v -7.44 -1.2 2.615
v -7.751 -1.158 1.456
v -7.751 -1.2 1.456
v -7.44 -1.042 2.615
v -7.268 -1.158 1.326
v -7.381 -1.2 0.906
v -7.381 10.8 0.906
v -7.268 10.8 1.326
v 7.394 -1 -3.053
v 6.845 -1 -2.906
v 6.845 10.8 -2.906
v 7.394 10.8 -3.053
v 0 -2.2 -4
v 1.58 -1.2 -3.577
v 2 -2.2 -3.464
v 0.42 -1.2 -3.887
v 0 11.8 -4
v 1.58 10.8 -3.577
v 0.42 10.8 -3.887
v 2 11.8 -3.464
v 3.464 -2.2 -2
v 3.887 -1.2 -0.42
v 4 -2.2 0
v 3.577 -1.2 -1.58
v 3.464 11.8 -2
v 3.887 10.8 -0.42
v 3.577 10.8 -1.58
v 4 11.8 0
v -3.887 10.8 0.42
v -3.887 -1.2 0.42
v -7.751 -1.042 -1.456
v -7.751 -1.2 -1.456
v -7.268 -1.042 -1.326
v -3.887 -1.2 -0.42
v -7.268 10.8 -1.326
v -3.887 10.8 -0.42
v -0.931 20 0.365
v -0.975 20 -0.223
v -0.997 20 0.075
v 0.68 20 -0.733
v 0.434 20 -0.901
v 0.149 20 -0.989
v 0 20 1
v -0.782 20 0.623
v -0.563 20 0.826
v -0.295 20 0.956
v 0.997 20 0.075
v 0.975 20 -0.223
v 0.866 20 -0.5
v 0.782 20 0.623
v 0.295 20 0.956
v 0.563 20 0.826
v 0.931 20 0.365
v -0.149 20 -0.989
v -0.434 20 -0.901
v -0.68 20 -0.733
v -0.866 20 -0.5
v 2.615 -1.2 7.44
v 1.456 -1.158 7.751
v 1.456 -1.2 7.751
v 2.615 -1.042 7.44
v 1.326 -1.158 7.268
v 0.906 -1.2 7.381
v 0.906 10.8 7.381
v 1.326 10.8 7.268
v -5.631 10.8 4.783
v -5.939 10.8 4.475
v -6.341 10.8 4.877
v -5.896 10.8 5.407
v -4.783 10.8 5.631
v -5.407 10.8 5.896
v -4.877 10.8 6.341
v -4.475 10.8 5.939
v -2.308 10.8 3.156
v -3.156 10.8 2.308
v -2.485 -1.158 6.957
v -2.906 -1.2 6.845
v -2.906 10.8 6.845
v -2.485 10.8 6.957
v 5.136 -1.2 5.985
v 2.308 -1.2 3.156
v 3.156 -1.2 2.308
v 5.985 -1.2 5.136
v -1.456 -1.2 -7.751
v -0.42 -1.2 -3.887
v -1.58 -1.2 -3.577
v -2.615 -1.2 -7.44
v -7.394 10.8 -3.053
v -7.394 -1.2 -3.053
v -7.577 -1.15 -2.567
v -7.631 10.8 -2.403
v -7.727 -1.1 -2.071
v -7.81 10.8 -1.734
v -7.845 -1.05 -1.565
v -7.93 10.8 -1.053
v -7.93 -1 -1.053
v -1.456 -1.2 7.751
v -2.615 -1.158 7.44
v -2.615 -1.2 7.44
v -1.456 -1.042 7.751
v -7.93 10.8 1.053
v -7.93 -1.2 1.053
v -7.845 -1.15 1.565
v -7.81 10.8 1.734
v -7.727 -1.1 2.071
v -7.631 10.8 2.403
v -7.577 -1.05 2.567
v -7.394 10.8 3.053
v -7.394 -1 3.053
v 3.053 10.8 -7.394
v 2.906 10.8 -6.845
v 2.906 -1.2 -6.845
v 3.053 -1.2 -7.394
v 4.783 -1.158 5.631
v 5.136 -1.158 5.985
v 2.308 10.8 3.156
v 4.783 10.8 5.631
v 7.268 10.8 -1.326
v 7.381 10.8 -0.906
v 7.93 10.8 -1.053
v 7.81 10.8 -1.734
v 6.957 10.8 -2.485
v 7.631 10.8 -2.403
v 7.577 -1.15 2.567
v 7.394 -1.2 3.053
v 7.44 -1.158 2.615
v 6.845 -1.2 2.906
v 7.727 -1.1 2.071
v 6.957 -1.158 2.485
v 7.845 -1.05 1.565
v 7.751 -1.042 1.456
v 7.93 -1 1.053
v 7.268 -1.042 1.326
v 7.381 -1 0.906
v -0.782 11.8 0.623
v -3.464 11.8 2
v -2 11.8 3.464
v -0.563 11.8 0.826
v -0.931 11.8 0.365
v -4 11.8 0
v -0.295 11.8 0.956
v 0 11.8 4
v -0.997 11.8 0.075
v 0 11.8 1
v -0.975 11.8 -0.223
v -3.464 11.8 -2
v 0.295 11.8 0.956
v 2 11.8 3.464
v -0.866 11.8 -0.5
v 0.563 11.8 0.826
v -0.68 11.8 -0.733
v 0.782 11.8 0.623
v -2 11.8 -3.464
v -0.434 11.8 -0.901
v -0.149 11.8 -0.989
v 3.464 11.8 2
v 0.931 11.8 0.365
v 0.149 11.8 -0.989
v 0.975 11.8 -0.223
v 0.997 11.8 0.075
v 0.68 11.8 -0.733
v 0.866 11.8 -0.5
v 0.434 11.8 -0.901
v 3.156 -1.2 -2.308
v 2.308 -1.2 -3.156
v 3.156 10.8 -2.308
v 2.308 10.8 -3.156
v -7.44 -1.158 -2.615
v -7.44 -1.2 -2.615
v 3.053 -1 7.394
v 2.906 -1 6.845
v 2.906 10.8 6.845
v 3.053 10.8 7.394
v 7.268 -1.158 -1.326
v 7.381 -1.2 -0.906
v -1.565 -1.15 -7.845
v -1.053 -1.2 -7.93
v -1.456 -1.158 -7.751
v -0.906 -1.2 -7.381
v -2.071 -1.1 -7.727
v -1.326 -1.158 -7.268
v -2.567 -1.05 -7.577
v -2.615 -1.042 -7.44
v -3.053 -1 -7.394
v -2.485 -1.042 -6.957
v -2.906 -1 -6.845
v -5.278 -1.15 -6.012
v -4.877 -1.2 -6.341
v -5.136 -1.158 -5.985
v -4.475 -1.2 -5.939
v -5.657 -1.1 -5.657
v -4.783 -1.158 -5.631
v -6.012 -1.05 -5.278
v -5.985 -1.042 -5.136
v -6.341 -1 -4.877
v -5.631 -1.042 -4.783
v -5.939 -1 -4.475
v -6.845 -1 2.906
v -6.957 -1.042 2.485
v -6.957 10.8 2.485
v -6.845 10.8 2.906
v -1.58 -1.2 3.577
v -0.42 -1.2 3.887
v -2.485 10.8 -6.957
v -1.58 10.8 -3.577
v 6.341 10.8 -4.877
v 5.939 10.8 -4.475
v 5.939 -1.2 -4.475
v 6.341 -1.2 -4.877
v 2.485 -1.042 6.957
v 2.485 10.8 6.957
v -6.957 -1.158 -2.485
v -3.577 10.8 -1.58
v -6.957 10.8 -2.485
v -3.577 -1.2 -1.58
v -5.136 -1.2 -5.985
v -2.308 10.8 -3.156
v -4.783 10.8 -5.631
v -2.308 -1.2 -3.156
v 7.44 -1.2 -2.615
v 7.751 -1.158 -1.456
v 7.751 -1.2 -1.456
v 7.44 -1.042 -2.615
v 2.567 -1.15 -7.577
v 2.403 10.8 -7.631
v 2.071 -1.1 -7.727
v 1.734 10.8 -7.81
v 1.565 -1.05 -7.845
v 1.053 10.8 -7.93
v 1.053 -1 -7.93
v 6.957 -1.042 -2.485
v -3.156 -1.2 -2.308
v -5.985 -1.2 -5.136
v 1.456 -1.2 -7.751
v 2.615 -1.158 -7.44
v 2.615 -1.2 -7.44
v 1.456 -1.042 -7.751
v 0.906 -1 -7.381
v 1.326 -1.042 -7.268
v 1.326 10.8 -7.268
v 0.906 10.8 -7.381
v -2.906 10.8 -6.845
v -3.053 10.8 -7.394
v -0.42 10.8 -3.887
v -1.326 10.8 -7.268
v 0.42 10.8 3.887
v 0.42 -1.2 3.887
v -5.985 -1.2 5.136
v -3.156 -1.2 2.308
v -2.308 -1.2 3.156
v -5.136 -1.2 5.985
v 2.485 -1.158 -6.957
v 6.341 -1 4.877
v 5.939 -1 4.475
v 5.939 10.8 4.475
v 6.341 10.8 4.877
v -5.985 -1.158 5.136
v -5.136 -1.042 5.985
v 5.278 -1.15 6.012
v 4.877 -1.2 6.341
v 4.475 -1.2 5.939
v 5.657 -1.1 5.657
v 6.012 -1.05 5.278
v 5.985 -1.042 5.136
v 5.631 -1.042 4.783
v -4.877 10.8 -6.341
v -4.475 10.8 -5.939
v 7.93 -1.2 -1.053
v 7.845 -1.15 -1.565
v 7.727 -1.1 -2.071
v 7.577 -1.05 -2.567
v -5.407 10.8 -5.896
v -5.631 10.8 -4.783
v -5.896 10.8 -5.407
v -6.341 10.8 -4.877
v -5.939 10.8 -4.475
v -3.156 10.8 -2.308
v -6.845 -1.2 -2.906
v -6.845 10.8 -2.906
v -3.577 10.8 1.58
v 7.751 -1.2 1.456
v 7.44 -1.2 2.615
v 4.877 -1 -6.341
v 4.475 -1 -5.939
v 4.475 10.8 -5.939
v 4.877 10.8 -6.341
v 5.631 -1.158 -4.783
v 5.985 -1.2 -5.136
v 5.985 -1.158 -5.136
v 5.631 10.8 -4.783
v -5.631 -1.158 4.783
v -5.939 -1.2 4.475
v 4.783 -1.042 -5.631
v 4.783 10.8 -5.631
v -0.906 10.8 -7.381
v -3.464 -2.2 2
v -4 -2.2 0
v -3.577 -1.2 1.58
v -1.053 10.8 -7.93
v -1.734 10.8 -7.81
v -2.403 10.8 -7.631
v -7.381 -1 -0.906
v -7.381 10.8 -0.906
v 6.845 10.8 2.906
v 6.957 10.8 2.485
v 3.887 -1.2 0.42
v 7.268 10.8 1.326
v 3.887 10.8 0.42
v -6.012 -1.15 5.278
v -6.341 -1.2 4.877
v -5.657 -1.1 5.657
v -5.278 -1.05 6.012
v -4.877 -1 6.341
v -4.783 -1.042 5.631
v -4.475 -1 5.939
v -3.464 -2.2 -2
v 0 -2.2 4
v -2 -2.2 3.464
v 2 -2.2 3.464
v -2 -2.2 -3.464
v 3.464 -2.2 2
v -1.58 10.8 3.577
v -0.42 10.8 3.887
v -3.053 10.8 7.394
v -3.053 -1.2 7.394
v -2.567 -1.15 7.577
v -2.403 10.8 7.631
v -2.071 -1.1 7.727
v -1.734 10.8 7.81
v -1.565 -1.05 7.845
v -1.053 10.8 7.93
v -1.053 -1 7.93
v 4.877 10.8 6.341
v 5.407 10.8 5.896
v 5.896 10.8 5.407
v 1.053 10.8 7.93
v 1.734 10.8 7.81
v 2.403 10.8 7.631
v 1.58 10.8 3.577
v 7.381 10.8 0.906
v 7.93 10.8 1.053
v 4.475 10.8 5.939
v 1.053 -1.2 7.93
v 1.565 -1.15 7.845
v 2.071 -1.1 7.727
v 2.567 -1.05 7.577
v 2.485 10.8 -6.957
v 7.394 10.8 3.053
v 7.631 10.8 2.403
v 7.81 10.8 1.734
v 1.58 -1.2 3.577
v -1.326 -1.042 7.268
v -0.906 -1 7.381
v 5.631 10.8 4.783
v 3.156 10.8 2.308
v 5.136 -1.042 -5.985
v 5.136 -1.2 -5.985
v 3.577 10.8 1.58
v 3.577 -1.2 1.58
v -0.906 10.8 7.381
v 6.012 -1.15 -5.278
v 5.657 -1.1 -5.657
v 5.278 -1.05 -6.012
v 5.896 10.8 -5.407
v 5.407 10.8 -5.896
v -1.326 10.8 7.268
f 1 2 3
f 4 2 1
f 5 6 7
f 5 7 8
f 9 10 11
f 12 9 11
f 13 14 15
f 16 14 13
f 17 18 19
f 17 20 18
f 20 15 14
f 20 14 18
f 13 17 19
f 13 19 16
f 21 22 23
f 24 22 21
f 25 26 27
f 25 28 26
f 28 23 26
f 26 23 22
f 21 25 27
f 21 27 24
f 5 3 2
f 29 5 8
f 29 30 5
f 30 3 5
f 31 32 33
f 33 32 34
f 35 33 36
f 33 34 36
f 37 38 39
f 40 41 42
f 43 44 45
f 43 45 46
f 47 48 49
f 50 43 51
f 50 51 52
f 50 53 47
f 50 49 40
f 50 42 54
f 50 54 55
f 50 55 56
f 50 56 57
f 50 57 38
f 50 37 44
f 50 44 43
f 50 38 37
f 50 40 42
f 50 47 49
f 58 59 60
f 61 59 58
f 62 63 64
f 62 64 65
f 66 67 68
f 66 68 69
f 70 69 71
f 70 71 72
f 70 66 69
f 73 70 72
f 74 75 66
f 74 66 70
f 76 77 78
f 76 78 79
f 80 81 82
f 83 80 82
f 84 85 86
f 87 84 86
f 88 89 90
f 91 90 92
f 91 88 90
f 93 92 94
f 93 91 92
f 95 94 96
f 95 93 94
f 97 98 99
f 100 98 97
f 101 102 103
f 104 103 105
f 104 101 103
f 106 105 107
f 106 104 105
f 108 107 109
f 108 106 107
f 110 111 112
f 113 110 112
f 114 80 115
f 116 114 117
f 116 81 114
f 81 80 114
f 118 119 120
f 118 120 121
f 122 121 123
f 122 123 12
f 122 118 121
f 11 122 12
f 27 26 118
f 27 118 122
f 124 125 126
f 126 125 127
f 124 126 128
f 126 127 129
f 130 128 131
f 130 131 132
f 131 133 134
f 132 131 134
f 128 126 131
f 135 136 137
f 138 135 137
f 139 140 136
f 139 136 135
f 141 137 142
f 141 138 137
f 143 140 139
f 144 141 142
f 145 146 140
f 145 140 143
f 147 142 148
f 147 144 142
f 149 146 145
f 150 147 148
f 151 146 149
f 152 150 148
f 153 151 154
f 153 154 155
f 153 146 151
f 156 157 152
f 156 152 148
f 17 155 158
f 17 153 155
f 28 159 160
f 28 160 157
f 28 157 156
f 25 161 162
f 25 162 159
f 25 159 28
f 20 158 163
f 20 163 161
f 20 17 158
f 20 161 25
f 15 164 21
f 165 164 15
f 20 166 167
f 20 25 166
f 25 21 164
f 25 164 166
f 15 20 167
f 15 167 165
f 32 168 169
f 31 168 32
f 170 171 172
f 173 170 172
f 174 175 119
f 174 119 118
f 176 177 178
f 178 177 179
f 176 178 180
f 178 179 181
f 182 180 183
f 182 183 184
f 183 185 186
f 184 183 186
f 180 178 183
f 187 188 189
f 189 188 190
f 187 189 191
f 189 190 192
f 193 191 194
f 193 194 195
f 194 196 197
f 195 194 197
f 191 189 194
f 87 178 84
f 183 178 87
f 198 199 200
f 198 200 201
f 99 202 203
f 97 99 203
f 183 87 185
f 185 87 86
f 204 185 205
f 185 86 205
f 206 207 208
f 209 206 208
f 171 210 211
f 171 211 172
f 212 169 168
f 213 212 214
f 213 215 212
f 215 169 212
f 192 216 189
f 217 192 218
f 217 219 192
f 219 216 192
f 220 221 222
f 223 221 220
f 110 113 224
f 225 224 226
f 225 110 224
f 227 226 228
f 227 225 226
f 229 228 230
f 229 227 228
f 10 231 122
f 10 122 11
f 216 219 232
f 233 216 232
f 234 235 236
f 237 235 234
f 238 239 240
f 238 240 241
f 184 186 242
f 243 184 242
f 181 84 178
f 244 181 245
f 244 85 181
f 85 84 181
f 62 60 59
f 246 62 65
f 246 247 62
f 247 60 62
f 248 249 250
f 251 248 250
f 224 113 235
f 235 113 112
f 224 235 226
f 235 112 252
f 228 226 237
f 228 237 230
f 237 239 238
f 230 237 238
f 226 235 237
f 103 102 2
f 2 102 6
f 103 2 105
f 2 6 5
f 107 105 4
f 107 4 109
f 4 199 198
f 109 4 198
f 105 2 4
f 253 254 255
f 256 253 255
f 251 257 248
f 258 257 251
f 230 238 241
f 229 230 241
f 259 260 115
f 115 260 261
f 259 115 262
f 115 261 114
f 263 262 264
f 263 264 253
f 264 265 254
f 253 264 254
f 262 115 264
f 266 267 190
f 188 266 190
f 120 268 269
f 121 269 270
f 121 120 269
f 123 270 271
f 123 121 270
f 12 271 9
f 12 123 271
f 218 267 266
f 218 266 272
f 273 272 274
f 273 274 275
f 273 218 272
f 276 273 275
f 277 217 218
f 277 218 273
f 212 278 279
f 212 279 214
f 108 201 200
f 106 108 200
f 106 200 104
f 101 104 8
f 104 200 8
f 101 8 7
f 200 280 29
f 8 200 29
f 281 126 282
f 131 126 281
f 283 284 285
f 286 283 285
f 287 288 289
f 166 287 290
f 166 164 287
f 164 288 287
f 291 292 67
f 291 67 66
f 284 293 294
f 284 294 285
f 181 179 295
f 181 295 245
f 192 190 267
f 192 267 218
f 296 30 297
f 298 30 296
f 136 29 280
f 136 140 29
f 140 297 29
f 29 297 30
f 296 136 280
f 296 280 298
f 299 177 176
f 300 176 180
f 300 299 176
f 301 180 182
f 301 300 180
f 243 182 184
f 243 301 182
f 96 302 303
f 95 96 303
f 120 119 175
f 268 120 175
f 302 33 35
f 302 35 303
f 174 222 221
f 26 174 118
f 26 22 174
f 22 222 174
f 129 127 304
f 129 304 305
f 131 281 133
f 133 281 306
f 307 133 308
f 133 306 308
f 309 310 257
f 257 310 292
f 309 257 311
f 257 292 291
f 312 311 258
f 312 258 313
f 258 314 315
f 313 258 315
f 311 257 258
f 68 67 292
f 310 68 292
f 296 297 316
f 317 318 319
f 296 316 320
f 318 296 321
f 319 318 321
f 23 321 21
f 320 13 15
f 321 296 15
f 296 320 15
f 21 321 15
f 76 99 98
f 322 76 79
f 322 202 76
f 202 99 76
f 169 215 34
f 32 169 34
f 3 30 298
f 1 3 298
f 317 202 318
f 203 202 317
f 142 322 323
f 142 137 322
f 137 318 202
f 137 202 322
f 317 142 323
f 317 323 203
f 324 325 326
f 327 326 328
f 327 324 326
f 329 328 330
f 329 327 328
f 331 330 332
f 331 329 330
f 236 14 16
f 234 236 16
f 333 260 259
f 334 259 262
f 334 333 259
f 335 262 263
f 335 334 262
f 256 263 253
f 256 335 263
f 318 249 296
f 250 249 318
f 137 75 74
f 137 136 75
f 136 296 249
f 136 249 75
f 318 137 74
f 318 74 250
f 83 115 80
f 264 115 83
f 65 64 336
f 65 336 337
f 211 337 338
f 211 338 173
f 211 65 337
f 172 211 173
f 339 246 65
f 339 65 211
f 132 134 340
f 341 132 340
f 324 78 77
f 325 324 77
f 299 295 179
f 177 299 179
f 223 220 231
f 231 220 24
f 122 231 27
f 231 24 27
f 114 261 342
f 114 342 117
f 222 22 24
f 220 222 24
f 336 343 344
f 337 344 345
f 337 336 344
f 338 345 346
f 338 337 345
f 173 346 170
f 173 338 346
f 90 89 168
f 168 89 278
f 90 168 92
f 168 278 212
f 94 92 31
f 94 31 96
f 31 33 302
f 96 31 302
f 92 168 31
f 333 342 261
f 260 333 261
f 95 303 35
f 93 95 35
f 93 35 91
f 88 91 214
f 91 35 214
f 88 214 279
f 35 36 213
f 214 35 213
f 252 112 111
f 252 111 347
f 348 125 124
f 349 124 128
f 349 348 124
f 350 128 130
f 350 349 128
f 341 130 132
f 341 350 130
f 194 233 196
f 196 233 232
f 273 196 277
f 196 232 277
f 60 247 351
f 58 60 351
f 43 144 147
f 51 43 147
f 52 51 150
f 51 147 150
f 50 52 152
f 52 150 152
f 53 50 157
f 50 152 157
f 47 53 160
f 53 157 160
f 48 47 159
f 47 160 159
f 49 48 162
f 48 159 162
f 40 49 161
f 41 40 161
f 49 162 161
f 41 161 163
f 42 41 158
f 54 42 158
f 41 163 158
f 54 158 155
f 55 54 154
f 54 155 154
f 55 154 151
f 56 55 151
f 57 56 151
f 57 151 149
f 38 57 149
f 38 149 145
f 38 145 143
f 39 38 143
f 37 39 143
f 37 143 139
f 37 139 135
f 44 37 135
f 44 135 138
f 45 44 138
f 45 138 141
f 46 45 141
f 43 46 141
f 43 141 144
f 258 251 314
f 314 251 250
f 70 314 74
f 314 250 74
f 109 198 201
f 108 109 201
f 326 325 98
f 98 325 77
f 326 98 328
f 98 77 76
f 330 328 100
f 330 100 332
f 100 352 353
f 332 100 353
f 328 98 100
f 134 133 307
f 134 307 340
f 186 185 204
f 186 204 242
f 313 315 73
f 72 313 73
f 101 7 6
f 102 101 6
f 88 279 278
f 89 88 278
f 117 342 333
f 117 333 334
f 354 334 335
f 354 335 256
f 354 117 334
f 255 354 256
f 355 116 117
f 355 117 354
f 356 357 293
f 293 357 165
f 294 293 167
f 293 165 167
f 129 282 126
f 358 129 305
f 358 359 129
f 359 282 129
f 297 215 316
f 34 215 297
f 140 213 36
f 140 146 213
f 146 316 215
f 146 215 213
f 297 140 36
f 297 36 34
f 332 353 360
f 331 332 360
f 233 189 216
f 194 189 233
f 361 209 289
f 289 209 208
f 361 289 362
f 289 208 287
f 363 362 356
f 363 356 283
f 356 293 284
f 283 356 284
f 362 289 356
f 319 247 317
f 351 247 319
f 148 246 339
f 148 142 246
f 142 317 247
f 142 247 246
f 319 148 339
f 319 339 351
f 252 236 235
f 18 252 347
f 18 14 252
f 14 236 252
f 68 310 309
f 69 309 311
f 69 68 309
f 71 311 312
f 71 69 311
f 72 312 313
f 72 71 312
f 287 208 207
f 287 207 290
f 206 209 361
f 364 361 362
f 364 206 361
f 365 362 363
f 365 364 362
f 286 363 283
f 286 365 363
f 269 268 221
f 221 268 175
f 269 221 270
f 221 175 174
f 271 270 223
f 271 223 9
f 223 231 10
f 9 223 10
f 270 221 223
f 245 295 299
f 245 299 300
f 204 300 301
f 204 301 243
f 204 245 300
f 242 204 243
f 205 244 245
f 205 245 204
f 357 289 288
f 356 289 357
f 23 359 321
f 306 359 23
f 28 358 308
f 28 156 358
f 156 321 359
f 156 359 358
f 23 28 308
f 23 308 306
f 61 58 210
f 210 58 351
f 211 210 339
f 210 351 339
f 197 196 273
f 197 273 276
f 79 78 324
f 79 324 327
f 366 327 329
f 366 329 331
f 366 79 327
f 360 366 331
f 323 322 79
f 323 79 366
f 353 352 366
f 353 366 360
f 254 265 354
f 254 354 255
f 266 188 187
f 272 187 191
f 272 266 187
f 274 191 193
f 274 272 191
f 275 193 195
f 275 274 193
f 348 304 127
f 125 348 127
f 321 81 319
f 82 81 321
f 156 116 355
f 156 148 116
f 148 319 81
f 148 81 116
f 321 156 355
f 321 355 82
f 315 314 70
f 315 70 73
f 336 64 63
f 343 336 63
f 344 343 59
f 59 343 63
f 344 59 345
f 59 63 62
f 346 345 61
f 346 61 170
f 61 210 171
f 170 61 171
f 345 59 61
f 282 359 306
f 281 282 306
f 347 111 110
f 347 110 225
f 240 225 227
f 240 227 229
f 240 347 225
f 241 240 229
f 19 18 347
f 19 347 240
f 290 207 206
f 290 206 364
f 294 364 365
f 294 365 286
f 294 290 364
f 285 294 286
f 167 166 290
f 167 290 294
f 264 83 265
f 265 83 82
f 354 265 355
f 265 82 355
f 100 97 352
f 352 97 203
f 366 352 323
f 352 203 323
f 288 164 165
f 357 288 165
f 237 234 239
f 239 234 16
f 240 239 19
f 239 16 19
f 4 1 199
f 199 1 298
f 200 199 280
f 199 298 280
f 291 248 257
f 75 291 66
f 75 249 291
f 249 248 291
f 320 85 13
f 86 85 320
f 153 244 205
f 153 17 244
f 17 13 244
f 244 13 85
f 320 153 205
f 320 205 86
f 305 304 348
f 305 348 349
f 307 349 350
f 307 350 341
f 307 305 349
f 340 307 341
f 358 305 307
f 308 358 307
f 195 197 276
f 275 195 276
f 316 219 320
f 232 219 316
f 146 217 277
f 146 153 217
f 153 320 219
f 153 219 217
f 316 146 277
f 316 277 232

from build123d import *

# Parameters (mm, degrees)
SKETCH_1_R               = 1
EXTRUDE_1_DEPTH          = 20
EXTRUDE_START            = -8.2
EXTRUDE_3_DEPTH          = 14
SKETCH_6_W               = 1.2
SKETCH_6_H               = 12
EXTRUDE_4_DEPTH          = 4
EXTRUDE_START_2          = -0.5
EXTRUDE_5_DEPTH          = 1.5
PATTERN_CIRCULAR_1_COUNT = 12
SKETCH_12_OUTSIDE_W      = 26.342
SKETCH_12_OUTSIDE_H      = 26.342
SKETCH_12_OUTSIDE_R      = 8
CUT_EXTRUDE_2_DEPTH      = 19.759656212


with BuildPart() as part:
    # 草图1 → 凸台-拉伸1 (new body)
    with BuildSketch(Plane(origin=(0, 0, 0), x_dir=(1, 0, 0), z_dir=(0, 1, 0))):
        with Locations(Location((0, 0, 0), (0, 0, 270))):
            Circle(SKETCH_1_R)
    extrude(amount=EXTRUDE_1_DEPTH)

    # 草图4 → 凸台-拉伸3 (add)
    with BuildSketch(Plane(origin=(0, 20, 0), x_dir=(1, 0, 0), z_dir=(0, 1, 0)).offset(EXTRUDE_START)):
        Polygon((4, 0), (3.464101615, 2), (2, 3.464101615), (0, 4), (-2, 3.464101615), (-3.464101615, 2), (-4, 0), (-3.464101615, -2), (-2, -3.464101615), (0, -4), (2, -3.464101615), (3.464101615, -2), align=None)
    extrude(amount=-EXTRUDE_3_DEPTH)

    # 草图6 → 凸台-拉伸4 (add)
    with BuildSketch(Plane(origin=(-3.732050808, 0, -1), x_dir=(-0.258819045102507, 0, 0.9659258262890721), z_dir=(-0.9659258262890721, 0, -0.258819045102507))):
        with Locations((0, 4.8)):
            Rectangle(SKETCH_6_W, SKETCH_6_H)
    extrude_4 = extrude(amount=EXTRUDE_4_DEPTH)

    # 草图7 → 凸台-拉伸5 (add)
    with BuildSketch(Plane(origin=(-7.595754113, 0, -2.03527618), x_dir=(-0.25881904510250703, 0, 0.9659258262890721), z_dir=(-0.9659258262890721, 0, -0.25881904510250703)).offset(EXTRUDE_START_2)):
        Polygon((1.03527618, 10.8), (-1.03527618, 10.8), (-1.03527618, -1.2), (1.03527618, -1), align=None)
    extrude_5 = extrude(amount=EXTRUDE_5_DEPTH)

    # 阵列(圆周)1: 凸台-拉伸4, 凸台-拉伸5 ×12 about axis
    pattern_circular_1_axis = Axis((0, 0, 0), (0, 1, 0))
    add([extrude_4.rotate(pattern_circular_1_axis, i * 360 / PATTERN_CIRCULAR_1_COUNT) for i in range(1, PATTERN_CIRCULAR_1_COUNT)])
    add([extrude_5.rotate(pattern_circular_1_axis, i * 360 / PATTERN_CIRCULAR_1_COUNT) for i in range(1, PATTERN_CIRCULAR_1_COUNT)])

    # 草图12 outside → 切除-拉伸2 (cut, through all)
    with BuildSketch(Plane(origin=(0, 11.8, 0), x_dir=(1, 0, 0), z_dir=(0, 1, 0))):
        Rectangle(SKETCH_12_OUTSIDE_W, SKETCH_12_OUTSIDE_H)
        Circle(SKETCH_12_OUTSIDE_R, mode=Mode.SUBTRACT)
    extrude(amount=-CUT_EXTRUDE_2_DEPTH, mode=Mode.SUBTRACT)


solid = part.part
